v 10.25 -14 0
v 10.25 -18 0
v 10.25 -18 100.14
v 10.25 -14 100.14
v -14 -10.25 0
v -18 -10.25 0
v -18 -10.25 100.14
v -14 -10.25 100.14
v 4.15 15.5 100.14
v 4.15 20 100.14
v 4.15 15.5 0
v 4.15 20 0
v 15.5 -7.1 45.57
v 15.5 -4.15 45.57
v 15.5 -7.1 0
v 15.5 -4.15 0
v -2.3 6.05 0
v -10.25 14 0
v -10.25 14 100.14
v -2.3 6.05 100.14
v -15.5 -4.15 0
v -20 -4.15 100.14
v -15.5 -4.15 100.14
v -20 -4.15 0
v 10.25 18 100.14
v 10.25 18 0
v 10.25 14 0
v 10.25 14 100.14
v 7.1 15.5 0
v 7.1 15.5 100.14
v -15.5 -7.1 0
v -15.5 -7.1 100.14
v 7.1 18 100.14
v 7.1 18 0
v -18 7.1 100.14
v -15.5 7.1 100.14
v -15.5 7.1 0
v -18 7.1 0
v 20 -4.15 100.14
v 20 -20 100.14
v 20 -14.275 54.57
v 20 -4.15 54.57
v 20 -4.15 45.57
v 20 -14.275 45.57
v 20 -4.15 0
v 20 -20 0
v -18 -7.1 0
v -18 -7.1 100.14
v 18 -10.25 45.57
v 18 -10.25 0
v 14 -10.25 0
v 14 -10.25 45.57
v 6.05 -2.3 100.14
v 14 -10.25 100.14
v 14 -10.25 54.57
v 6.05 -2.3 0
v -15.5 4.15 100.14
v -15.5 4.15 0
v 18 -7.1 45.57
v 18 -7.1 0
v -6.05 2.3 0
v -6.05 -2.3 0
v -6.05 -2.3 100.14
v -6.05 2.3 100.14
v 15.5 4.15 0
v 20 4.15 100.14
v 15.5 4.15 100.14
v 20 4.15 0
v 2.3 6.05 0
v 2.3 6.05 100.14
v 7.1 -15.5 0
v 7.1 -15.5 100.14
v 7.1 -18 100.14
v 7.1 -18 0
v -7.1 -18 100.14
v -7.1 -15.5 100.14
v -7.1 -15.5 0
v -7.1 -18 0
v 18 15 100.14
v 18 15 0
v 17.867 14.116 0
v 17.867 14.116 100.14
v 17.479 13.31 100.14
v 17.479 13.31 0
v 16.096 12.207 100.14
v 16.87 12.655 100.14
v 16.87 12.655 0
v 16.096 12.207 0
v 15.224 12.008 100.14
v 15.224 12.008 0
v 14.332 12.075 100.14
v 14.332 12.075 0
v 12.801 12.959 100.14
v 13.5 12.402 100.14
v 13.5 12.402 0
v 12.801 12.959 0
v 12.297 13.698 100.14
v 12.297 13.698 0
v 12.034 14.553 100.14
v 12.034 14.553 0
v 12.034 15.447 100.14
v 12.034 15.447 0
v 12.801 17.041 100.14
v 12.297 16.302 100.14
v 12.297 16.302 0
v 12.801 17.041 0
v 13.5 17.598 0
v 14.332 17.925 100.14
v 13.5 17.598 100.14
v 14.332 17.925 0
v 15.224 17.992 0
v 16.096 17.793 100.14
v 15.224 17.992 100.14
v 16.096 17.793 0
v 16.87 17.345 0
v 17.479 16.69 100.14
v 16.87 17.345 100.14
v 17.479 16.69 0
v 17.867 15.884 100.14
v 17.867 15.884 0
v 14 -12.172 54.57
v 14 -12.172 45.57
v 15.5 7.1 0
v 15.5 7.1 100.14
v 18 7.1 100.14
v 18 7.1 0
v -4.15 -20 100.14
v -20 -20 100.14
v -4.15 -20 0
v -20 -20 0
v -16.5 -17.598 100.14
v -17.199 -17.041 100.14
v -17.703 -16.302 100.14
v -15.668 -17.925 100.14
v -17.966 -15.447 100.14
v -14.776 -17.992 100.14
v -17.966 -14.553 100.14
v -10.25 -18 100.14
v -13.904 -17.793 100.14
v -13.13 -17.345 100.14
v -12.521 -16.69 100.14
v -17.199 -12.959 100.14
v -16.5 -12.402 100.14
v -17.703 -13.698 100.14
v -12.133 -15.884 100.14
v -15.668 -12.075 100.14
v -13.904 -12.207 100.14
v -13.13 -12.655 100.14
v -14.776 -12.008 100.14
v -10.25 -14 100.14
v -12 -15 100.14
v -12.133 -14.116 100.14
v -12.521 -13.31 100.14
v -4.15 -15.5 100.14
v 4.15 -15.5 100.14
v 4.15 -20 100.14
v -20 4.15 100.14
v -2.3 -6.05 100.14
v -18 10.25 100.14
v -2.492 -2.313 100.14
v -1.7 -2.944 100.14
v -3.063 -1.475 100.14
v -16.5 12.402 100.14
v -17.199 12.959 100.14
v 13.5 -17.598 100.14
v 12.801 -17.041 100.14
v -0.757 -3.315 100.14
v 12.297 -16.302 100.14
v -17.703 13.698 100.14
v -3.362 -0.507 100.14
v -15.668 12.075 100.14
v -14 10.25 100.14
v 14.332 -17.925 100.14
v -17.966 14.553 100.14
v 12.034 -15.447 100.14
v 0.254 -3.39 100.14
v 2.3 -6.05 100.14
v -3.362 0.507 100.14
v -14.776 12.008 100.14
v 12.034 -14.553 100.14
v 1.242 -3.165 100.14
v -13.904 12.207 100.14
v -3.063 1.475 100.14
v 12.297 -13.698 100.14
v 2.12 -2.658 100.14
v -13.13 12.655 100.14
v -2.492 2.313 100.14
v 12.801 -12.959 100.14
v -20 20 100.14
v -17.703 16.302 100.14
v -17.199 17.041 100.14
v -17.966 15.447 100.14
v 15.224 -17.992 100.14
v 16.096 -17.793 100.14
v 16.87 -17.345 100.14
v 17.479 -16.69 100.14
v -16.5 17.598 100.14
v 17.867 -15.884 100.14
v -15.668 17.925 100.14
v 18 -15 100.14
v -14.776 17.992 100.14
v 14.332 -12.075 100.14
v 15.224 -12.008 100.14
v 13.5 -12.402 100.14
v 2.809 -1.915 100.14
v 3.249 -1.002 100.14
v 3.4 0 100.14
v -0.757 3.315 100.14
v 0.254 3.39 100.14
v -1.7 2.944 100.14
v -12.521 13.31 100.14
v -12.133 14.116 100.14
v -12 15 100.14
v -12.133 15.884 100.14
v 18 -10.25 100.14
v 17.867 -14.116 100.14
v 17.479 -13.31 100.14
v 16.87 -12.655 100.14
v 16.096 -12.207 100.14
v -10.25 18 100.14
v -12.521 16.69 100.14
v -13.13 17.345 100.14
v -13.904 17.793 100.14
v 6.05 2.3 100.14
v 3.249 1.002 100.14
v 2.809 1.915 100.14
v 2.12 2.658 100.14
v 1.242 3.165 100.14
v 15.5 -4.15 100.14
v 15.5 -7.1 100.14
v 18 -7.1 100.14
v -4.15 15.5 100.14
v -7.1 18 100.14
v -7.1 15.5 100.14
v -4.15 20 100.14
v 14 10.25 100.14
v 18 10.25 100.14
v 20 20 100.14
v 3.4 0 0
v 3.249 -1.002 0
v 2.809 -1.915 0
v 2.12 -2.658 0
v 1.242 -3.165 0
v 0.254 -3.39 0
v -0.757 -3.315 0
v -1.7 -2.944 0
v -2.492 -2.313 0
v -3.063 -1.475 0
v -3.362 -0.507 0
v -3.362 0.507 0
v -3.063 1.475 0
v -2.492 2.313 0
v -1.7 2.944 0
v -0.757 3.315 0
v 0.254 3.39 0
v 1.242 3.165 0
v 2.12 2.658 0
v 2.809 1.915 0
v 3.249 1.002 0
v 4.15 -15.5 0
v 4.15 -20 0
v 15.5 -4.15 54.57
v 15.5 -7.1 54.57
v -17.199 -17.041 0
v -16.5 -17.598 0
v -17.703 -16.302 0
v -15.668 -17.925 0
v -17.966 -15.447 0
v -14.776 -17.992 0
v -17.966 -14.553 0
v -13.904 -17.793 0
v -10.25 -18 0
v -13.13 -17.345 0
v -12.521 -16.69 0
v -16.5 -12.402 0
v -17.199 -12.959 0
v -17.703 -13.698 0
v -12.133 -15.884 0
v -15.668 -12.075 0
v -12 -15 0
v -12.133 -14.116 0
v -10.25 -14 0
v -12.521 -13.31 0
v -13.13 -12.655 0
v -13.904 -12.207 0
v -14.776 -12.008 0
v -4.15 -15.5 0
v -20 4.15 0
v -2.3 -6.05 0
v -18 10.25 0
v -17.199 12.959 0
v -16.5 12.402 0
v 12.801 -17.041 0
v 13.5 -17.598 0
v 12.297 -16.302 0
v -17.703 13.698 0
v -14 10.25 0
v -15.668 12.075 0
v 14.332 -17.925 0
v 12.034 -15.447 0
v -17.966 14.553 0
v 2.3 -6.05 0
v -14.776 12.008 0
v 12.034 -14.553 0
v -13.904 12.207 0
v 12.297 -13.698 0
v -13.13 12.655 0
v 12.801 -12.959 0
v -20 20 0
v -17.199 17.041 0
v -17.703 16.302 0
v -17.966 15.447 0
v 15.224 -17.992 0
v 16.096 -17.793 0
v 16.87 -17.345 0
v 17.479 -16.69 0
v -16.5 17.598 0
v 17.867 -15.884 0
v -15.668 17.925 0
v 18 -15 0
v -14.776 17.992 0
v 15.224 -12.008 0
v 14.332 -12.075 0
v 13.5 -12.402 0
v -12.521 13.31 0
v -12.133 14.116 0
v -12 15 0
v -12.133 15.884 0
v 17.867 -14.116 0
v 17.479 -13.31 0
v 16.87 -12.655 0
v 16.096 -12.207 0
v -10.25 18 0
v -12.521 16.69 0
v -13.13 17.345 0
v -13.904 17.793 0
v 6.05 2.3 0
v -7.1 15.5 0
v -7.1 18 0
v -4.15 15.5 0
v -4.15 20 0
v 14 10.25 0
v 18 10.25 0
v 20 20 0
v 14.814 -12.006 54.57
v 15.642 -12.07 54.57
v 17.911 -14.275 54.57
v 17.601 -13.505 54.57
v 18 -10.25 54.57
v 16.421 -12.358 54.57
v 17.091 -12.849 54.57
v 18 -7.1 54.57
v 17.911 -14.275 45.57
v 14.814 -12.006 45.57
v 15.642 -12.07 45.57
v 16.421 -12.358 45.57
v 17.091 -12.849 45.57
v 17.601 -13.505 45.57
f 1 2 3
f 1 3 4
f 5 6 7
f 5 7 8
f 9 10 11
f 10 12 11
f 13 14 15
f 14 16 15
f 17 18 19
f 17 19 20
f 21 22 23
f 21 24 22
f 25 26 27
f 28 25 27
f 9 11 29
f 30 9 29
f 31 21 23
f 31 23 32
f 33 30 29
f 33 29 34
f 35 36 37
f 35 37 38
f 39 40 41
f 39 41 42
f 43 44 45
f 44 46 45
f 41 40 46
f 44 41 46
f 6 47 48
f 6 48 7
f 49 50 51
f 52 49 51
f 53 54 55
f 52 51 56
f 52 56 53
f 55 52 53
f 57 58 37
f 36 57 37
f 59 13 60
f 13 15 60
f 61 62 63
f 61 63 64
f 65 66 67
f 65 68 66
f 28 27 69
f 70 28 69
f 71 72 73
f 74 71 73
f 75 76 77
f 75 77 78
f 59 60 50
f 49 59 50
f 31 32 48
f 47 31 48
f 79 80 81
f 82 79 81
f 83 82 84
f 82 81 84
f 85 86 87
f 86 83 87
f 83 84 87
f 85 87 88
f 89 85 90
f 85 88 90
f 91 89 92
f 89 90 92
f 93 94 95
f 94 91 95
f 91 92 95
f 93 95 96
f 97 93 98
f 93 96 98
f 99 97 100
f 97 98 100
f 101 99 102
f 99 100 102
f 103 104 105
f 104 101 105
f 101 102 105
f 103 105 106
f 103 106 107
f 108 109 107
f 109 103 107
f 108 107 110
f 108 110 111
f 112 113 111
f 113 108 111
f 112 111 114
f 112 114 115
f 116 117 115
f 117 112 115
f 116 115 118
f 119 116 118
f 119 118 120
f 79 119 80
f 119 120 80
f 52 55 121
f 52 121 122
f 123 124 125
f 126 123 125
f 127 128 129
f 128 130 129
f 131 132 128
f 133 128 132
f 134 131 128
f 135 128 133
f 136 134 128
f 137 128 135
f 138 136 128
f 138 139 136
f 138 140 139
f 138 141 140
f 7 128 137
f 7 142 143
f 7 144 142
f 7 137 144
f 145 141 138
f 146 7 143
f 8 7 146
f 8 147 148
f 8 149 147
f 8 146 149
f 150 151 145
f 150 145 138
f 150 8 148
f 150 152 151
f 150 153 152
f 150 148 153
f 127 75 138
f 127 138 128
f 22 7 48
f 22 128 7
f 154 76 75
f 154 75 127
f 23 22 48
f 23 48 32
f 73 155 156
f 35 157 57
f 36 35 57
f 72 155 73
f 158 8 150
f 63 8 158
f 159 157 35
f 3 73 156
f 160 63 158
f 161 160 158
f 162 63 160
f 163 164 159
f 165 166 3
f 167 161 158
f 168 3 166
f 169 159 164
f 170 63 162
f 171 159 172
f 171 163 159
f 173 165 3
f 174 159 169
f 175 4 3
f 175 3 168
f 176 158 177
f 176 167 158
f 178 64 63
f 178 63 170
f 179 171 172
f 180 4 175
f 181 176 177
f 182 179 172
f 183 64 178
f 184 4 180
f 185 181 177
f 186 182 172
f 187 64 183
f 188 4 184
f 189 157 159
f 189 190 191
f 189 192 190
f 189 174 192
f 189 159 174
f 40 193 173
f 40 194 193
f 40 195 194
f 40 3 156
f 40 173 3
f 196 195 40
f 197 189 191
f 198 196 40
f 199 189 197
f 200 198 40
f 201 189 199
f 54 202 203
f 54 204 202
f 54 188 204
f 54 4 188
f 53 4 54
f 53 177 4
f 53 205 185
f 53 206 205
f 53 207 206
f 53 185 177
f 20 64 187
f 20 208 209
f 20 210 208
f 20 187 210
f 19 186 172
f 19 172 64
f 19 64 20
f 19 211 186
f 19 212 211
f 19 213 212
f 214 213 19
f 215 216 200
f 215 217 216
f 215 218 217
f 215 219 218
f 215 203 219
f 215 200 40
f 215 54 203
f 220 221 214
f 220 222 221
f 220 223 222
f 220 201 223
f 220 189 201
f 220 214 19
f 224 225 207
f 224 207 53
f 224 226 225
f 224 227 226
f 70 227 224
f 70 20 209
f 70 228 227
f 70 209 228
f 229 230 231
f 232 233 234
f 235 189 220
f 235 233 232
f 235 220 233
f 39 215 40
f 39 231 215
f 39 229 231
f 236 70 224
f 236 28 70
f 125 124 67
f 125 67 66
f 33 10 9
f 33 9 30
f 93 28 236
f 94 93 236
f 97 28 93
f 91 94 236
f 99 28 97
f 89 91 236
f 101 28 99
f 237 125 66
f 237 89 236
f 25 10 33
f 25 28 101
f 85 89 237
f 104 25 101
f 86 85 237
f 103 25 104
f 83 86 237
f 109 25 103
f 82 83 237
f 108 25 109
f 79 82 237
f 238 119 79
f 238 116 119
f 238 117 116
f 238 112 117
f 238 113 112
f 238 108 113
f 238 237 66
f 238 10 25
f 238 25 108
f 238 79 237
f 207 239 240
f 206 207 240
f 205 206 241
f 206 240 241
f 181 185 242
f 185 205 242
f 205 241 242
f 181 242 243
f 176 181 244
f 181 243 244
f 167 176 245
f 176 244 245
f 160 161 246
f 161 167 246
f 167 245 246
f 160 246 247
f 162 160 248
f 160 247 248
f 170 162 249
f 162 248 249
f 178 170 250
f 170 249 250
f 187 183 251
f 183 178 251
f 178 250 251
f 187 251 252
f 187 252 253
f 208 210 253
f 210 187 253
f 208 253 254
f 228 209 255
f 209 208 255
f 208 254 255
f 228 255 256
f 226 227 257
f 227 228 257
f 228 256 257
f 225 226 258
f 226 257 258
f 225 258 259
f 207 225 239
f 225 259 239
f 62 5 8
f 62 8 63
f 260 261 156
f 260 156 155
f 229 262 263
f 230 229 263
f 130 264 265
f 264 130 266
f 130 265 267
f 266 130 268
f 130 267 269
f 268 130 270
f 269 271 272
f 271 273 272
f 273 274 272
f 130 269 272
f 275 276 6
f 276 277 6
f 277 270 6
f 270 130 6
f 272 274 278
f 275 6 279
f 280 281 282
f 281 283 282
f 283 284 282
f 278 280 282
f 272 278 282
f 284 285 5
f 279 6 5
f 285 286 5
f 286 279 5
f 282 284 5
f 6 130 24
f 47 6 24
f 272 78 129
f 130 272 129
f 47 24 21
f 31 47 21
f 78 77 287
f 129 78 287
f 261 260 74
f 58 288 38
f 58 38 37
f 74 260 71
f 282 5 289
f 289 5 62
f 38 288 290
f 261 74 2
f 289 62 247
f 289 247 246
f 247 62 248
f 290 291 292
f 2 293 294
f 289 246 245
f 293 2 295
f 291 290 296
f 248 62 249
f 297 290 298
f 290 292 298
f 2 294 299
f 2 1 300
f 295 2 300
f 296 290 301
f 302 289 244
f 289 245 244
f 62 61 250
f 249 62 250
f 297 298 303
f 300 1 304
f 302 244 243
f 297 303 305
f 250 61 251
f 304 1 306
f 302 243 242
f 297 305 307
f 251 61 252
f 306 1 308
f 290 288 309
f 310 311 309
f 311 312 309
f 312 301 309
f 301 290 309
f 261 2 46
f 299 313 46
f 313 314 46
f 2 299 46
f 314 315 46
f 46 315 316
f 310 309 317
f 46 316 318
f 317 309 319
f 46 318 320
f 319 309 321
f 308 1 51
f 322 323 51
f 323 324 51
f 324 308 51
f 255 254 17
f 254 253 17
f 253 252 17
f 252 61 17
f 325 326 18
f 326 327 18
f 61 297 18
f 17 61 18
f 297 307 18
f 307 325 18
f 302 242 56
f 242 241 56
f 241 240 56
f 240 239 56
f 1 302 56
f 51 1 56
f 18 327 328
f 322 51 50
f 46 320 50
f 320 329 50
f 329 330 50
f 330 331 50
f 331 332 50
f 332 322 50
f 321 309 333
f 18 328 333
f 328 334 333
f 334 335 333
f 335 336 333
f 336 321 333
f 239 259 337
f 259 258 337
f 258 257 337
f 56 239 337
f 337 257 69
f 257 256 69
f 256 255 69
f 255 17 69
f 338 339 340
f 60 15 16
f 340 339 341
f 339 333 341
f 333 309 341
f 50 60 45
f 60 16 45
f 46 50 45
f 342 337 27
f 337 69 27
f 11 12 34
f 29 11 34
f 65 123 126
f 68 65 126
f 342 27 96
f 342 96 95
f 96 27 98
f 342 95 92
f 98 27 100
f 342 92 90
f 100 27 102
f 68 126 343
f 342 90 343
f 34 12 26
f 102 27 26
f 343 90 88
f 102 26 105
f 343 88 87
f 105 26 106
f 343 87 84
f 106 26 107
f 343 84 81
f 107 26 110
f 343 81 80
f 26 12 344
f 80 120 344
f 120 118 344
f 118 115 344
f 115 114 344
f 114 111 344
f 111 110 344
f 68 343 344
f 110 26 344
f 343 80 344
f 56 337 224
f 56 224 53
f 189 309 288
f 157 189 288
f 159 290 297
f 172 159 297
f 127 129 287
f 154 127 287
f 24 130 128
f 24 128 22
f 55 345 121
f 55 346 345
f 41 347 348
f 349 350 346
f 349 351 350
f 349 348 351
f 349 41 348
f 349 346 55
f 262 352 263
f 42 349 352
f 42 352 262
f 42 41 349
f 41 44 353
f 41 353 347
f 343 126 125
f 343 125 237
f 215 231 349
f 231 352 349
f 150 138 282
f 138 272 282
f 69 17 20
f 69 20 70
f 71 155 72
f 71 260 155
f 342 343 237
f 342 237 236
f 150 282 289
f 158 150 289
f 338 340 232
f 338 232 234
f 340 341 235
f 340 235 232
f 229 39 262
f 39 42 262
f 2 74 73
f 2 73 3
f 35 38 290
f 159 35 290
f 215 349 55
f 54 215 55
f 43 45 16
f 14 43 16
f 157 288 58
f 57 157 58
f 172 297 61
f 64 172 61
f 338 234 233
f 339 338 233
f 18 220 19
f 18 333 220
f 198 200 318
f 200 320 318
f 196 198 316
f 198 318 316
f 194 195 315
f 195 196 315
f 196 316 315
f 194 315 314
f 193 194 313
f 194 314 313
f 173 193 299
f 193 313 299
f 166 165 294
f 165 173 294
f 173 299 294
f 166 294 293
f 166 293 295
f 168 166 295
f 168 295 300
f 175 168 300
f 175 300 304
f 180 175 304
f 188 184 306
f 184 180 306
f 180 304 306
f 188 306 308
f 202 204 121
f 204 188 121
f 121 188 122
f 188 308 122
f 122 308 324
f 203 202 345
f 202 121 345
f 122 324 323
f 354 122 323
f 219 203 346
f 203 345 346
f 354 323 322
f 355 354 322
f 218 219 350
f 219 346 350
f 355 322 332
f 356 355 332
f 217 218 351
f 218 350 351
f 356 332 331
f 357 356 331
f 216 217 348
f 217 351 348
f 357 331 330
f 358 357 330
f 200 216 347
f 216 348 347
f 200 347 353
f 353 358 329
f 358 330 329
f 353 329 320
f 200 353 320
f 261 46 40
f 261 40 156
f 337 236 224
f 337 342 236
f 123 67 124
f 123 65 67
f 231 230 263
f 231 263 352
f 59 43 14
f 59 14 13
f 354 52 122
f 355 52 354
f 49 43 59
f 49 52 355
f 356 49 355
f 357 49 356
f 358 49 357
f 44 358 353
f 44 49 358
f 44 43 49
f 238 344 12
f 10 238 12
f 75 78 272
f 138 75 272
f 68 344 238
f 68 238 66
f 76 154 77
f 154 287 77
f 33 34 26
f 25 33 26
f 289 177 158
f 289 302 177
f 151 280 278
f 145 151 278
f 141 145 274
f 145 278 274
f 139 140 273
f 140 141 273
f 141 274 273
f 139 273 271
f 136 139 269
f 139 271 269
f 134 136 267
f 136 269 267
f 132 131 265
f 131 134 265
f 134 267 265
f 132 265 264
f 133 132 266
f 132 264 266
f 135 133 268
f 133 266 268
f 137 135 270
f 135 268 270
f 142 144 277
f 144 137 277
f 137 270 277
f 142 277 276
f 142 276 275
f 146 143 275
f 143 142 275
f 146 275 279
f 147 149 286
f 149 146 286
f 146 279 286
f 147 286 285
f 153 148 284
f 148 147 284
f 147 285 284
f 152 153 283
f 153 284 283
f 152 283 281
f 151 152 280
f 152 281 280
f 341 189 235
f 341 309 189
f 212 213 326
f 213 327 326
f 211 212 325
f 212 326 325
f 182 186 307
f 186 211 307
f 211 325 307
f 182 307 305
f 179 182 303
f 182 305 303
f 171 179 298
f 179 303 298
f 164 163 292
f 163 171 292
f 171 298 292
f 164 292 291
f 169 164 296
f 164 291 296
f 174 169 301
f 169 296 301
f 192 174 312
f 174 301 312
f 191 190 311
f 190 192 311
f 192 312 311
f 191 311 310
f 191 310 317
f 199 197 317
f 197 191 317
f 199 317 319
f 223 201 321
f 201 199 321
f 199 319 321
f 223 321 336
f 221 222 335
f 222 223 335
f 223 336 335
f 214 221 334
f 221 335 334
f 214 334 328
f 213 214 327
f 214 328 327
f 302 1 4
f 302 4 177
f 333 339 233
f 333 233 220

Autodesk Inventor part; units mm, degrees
ref_plane "YZ Plane" through (0, 0, 0) normal (1, 0, 0) x (0, 1, 0)
ref_plane "XZ Plane" through (0, 0, 0) normal (0, 1, 0) x (-1, 0, 0)
ref_plane "XY Plane" through (0, 0, 0) normal (0, 0, 1) x (1, 0, 0)
sketch "Sketch1" plane through (0, 0, 0) normal (0, 0, 1) x (1, 0, 0)
  circle A0 centre (0, 0) radius 3.4
  line L0 (0, 0) -> (20, 20) construction
  line L1 (0, 0) -> (28.2843, 0) construction
  line L2 (20, 20) -> (4.15, 20)
  line L3 (4.15, 20) -> (4.15, 15.5)
  line L4 (4.15, 15.5) -> (7.1, 15.5)
  line L5 (7.1, 15.5) -> (7.1, 18)
  line L6 (7.1, 18) -> (10.25, 18)
  line L7 (10.25, 18) -> (10.25, 14)
  line L8 (0, 0) -> (0, 26.1056) construction
  line L9 (10.25, 14) -> (2.3, 6.05)
  line L10 (2.3, 6.05) -> (0, 6.05)
  circle A1 centre (15, 15) radius 3
  line L11 (20, 20) -> (20, 4.15)
  line L12 (20, 4.15) -> (15.5, 4.15)
  line L13 (15.5, 4.15) -> (15.5, 7.1)
  line L14 (15.5, 7.1) -> (18, 7.1)
  line L15 (18, 7.1) -> (18, 10.25)
  line L16 (18, 10.25) -> (14, 10.25)
  line L17 (14, 10.25) -> (6.05, 2.3)
  line L18 (6.05, 2.3) -> (6.05, 0)
  line L19 (-2.3, 6.05) -> (0, 6.05)
  line L20 (-10.25, 14) -> (-2.3, 6.05)
  line L21 (-10.25, 18) -> (-10.25, 14)
  line L22 (-4.15, 15.5) -> (-7.1, 15.5)
  line L23 (-7.1, 15.5) -> (-7.1, 18)
  line L24 (-7.1, 18) -> (-10.25, 18)
  line L25 (-4.15, 20) -> (-4.15, 15.5)
  line L26 (-20, 20) -> (-4.15, 20)
  circle A2 centre (-15, 15) radius 3
  line L27 (-20, 20) -> (-20, 4.15)
  line L28 (-14, 10.25) -> (-6.05, 2.3)
  line L29 (-18, 7.1) -> (-18, 10.25)
  line L30 (-18, 10.25) -> (-14, 10.25)
  line L31 (-20, 4.15) -> (-15.5, 4.15)
  line L32 (-15.5, 4.15) -> (-15.5, 7.1)
  line L33 (-15.5, 7.1) -> (-18, 7.1)
  line L34 (-6.05, 2.3) -> (-6.05, 0)
  line L35 (-6.05, -2.3) -> (-6.05, 0)
  line L36 (-14, -10.25) -> (-6.05, -2.3)
  line L37 (-18, -10.25) -> (-14, -10.25)
  line L38 (-15.5, -4.15) -> (-15.5, -7.1)
  line L39 (-15.5, -7.1) -> (-18, -7.1)
  line L40 (-18, -7.1) -> (-18, -10.25)
  line L41 (-20, -4.15) -> (-15.5, -4.15)
  line L42 (-20, -20) -> (-20, -4.15)
  circle A3 centre (-15, -15) radius 3
  line L43 (-20, -20) -> (-4.15, -20)
  line L44 (-10.25, -14) -> (-2.3, -6.05)
  line L45 (-7.1, -18) -> (-10.25, -18)
  line L46 (-10.25, -18) -> (-10.25, -14)
  line L47 (-4.15, -20) -> (-4.15, -15.5)
  line L48 (-4.15, -15.5) -> (-7.1, -15.5)
  line L49 (-7.1, -15.5) -> (-7.1, -18)
  line L50 (-2.3, -6.05) -> (0, -6.05)
  line L51 (2.3, -6.05) -> (0, -6.05)
  line L52 (10.25, -14) -> (2.3, -6.05)
  line L53 (10.25, -18) -> (10.25, -14)
  line L54 (4.15, -15.5) -> (7.1, -15.5)
  line L55 (7.1, -15.5) -> (7.1, -18)
  line L56 (7.1, -18) -> (10.25, -18)
  line L57 (4.15, -20) -> (4.15, -15.5)
  line L58 (20, -20) -> (4.15, -20)
  circle A4 centre (15, -15) radius 3
  line L59 (20, -20) -> (20, -4.15)
  line L60 (14, -10.25) -> (6.05, -2.3)
  line L61 (18, -7.1) -> (18, -10.25)
  line L62 (18, -10.25) -> (14, -10.25)
  line L63 (20, -4.15) -> (15.5, -4.15)
  line L64 (15.5, -4.15) -> (15.5, -7.1)
  line L65 (15.5, -7.1) -> (18, -7.1)
  line L66 (6.05, -2.3) -> (6.05, 0)
  point P0 (0, 6.05)
  point P1 (-6.05, 0)
  point P2 (0, -6.05)
  dimension "d0" = 6.8
  dimension "d1" = 45
  dimension "d2" = 20
  dimension "d3" = 6
  dimension "d4" = 15
  dimension "d5" = 10.25
  dimension "d6" = 7.1
  dimension "d7" = 4.15
  dimension "d8" = 4.5
  dimension "d9" = 2
  dimension "d10" = 13.95
  dimension "d11" = 6
  dimension "d14" = 360
extrude "Extrusion1" add sketch "Sketch1" along normal blind 100.14
ref_plane "Work Plane1" through (0, 0, 50.07) normal (0, 0, 1) x (1, 0, 0)
sketch "Sketch2" plane through (20, -20, 0) normal (1, 0, 0) x (0, 0, -1)
  line L0 (-45.845, 6) -> (-45.845, 10.92) projected
  line L1 (-45.845, 10.92) -> (-54.295, 10.92) projected
  line L2 (-54.295, 10.92) -> (-54.295, 6) projected
  line L3 (-54.295, 6) -> (-45.845, 6) projected
  line L4 (-45.57, 11.195) -> (-45.57, 5.725)
  line L5 (-45.57, 5.725) -> (-54.57, 5.725)
  line L6 (-54.57, 5.725) -> (-54.57, 11.195)
  line L7 (-54.57, 11.195) -> (-45.57, 11.195)
  line L8 (0, 15.85) -> (-100.14, 15.85) projected
  line L9 (-54.57, 11.195) -> (-54.57, 15.85)
  line L10 (-45.57, 11.195) -> (-45.57, 15.85)
  point P0 (0, 20)
  dimension "d18" = 0.275
extrude "Extrusion2" cut sketch "Sketch2" against normal blind 6 contours L3 L2 L1 L0 | L4 L5 L6 L7 | L7 L9 L8 L10
properties part number "Aluminum_Profile_4040_100.14mm_top" material "Aluminum 6061-AHC"
